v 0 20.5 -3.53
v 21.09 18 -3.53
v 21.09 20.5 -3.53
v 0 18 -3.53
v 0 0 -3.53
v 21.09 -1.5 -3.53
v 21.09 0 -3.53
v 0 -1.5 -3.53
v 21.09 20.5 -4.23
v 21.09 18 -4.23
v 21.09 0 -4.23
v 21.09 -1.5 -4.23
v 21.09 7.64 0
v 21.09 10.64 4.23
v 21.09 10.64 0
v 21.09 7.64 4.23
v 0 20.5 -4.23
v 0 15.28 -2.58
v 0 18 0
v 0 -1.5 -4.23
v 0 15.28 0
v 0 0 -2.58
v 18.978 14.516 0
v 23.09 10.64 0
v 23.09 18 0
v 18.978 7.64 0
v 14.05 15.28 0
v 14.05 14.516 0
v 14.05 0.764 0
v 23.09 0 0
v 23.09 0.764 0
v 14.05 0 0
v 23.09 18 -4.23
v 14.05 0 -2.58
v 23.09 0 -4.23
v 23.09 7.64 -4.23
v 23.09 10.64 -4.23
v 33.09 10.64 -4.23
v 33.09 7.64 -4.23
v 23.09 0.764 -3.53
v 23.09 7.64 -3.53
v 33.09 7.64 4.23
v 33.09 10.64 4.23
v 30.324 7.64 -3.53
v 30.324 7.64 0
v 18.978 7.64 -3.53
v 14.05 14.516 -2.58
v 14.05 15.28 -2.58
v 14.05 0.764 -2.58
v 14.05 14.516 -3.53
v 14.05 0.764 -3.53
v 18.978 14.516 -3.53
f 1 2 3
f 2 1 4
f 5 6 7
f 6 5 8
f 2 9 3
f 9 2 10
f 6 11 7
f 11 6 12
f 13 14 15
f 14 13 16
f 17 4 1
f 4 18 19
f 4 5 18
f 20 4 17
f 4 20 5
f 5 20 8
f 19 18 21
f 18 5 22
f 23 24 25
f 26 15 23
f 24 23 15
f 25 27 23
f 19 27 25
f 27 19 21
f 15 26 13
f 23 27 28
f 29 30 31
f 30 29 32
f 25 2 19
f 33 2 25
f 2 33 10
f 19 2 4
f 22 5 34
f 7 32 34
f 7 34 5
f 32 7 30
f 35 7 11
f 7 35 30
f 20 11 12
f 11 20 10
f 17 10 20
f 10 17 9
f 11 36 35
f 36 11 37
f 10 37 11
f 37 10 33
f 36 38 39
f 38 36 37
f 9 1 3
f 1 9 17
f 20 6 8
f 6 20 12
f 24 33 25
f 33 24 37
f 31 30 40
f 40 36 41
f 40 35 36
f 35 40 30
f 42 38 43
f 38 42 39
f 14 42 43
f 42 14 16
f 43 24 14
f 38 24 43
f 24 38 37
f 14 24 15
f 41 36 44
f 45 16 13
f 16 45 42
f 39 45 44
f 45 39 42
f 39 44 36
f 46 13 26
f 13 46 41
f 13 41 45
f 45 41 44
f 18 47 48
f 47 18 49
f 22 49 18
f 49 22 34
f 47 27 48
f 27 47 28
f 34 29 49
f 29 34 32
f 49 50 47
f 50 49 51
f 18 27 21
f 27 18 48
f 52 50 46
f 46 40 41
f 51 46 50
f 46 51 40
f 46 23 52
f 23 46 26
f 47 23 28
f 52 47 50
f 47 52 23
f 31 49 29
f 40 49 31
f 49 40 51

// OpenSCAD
// Holder for matching FTDI 6 pin 0.1" header to the T2 case debug
// uart cutout

// External base measurements
// debug uart case cutout
cutoutXMM =  3.53;
cutoutYMM = 19.00;
cutoutZMM = 21.09;  // To base of male header

// FTDI 6 pin 0.1" measurements
serialXMM =  2.58;
serialYMM = 15.28;
serialZMM = 14.05;

// Internal base measurements
serialExtraYMM = 0.0;

cutoutReliefYMM = 1.0;

flangeExtraXMM = 0.35;
flangeExtraYMM = 3.00;
flangeExtraZMM = 0.00;

shoeBoxZMM = 2.00;

grabTabYMM =  3.00;
grabTabZMM = 12.00;

module handle() {
     effectiveCutoutYMM = cutoutYMM-cutoutReliefYMM;
     init = [cutoutXMM,effectiveCutoutYMM,cutoutZMM];
     hdr =  [serialXMM,serialYMM+serialExtraYMM,serialZMM];

     flangeSize=[2*flangeExtraXMM,
                 cutoutYMM+flangeExtraYMM,
                 cutoutZMM+flangeExtraZMM];
     flangePos=[cutoutXMM,-flangeExtraYMM/2,0];

     wireBoxSize = [cutoutXMM,
                    .90*hdr[1],
                    .70*(cutoutZMM-serialZMM)];
     wireBoxPos = [0,(hdr[1]-wireBoxSize[1])/2,serialZMM];

     shoeBoxSize = [cutoutXMM+2*flangeExtraXMM,effectiveCutoutYMM,shoeBoxZMM];
     shoeBoxPos = [0,0,cutoutZMM];

     wireExitSize = [cutoutXMM,
                     wireBoxSize[1]/2,
                     (cutoutZMM-shoeBoxSize[2]-0*serialZMM)-wireBoxSize[2]];
     wireExitPos = [0,wireBoxPos[1],cutoutZMM-wireBoxSize[2]];

     grabTabSize = [2*shoeBoxSize[0],grabTabYMM,grabTabZMM];
     grabTabPos = [-grabTabSize[0]/2,
                   wireExitPos[1]+wireExitSize[1],
                   cutoutZMM];
     difference () {
          union() {
               cube(init);
               translate(flangePos)
                    cube(flangeSize);
               translate(shoeBoxPos)
                    cube(shoeBoxSize);
               translate(grabTabPos)
                    #cube(grabTabSize);
          }
          cube(hdr);
          translate(wireBoxPos)
               cube(wireBoxSize);
          translate(wireExitPos)
               #cube(wireExitSize);

     }
}

rotate([0,90,0])
handle();
